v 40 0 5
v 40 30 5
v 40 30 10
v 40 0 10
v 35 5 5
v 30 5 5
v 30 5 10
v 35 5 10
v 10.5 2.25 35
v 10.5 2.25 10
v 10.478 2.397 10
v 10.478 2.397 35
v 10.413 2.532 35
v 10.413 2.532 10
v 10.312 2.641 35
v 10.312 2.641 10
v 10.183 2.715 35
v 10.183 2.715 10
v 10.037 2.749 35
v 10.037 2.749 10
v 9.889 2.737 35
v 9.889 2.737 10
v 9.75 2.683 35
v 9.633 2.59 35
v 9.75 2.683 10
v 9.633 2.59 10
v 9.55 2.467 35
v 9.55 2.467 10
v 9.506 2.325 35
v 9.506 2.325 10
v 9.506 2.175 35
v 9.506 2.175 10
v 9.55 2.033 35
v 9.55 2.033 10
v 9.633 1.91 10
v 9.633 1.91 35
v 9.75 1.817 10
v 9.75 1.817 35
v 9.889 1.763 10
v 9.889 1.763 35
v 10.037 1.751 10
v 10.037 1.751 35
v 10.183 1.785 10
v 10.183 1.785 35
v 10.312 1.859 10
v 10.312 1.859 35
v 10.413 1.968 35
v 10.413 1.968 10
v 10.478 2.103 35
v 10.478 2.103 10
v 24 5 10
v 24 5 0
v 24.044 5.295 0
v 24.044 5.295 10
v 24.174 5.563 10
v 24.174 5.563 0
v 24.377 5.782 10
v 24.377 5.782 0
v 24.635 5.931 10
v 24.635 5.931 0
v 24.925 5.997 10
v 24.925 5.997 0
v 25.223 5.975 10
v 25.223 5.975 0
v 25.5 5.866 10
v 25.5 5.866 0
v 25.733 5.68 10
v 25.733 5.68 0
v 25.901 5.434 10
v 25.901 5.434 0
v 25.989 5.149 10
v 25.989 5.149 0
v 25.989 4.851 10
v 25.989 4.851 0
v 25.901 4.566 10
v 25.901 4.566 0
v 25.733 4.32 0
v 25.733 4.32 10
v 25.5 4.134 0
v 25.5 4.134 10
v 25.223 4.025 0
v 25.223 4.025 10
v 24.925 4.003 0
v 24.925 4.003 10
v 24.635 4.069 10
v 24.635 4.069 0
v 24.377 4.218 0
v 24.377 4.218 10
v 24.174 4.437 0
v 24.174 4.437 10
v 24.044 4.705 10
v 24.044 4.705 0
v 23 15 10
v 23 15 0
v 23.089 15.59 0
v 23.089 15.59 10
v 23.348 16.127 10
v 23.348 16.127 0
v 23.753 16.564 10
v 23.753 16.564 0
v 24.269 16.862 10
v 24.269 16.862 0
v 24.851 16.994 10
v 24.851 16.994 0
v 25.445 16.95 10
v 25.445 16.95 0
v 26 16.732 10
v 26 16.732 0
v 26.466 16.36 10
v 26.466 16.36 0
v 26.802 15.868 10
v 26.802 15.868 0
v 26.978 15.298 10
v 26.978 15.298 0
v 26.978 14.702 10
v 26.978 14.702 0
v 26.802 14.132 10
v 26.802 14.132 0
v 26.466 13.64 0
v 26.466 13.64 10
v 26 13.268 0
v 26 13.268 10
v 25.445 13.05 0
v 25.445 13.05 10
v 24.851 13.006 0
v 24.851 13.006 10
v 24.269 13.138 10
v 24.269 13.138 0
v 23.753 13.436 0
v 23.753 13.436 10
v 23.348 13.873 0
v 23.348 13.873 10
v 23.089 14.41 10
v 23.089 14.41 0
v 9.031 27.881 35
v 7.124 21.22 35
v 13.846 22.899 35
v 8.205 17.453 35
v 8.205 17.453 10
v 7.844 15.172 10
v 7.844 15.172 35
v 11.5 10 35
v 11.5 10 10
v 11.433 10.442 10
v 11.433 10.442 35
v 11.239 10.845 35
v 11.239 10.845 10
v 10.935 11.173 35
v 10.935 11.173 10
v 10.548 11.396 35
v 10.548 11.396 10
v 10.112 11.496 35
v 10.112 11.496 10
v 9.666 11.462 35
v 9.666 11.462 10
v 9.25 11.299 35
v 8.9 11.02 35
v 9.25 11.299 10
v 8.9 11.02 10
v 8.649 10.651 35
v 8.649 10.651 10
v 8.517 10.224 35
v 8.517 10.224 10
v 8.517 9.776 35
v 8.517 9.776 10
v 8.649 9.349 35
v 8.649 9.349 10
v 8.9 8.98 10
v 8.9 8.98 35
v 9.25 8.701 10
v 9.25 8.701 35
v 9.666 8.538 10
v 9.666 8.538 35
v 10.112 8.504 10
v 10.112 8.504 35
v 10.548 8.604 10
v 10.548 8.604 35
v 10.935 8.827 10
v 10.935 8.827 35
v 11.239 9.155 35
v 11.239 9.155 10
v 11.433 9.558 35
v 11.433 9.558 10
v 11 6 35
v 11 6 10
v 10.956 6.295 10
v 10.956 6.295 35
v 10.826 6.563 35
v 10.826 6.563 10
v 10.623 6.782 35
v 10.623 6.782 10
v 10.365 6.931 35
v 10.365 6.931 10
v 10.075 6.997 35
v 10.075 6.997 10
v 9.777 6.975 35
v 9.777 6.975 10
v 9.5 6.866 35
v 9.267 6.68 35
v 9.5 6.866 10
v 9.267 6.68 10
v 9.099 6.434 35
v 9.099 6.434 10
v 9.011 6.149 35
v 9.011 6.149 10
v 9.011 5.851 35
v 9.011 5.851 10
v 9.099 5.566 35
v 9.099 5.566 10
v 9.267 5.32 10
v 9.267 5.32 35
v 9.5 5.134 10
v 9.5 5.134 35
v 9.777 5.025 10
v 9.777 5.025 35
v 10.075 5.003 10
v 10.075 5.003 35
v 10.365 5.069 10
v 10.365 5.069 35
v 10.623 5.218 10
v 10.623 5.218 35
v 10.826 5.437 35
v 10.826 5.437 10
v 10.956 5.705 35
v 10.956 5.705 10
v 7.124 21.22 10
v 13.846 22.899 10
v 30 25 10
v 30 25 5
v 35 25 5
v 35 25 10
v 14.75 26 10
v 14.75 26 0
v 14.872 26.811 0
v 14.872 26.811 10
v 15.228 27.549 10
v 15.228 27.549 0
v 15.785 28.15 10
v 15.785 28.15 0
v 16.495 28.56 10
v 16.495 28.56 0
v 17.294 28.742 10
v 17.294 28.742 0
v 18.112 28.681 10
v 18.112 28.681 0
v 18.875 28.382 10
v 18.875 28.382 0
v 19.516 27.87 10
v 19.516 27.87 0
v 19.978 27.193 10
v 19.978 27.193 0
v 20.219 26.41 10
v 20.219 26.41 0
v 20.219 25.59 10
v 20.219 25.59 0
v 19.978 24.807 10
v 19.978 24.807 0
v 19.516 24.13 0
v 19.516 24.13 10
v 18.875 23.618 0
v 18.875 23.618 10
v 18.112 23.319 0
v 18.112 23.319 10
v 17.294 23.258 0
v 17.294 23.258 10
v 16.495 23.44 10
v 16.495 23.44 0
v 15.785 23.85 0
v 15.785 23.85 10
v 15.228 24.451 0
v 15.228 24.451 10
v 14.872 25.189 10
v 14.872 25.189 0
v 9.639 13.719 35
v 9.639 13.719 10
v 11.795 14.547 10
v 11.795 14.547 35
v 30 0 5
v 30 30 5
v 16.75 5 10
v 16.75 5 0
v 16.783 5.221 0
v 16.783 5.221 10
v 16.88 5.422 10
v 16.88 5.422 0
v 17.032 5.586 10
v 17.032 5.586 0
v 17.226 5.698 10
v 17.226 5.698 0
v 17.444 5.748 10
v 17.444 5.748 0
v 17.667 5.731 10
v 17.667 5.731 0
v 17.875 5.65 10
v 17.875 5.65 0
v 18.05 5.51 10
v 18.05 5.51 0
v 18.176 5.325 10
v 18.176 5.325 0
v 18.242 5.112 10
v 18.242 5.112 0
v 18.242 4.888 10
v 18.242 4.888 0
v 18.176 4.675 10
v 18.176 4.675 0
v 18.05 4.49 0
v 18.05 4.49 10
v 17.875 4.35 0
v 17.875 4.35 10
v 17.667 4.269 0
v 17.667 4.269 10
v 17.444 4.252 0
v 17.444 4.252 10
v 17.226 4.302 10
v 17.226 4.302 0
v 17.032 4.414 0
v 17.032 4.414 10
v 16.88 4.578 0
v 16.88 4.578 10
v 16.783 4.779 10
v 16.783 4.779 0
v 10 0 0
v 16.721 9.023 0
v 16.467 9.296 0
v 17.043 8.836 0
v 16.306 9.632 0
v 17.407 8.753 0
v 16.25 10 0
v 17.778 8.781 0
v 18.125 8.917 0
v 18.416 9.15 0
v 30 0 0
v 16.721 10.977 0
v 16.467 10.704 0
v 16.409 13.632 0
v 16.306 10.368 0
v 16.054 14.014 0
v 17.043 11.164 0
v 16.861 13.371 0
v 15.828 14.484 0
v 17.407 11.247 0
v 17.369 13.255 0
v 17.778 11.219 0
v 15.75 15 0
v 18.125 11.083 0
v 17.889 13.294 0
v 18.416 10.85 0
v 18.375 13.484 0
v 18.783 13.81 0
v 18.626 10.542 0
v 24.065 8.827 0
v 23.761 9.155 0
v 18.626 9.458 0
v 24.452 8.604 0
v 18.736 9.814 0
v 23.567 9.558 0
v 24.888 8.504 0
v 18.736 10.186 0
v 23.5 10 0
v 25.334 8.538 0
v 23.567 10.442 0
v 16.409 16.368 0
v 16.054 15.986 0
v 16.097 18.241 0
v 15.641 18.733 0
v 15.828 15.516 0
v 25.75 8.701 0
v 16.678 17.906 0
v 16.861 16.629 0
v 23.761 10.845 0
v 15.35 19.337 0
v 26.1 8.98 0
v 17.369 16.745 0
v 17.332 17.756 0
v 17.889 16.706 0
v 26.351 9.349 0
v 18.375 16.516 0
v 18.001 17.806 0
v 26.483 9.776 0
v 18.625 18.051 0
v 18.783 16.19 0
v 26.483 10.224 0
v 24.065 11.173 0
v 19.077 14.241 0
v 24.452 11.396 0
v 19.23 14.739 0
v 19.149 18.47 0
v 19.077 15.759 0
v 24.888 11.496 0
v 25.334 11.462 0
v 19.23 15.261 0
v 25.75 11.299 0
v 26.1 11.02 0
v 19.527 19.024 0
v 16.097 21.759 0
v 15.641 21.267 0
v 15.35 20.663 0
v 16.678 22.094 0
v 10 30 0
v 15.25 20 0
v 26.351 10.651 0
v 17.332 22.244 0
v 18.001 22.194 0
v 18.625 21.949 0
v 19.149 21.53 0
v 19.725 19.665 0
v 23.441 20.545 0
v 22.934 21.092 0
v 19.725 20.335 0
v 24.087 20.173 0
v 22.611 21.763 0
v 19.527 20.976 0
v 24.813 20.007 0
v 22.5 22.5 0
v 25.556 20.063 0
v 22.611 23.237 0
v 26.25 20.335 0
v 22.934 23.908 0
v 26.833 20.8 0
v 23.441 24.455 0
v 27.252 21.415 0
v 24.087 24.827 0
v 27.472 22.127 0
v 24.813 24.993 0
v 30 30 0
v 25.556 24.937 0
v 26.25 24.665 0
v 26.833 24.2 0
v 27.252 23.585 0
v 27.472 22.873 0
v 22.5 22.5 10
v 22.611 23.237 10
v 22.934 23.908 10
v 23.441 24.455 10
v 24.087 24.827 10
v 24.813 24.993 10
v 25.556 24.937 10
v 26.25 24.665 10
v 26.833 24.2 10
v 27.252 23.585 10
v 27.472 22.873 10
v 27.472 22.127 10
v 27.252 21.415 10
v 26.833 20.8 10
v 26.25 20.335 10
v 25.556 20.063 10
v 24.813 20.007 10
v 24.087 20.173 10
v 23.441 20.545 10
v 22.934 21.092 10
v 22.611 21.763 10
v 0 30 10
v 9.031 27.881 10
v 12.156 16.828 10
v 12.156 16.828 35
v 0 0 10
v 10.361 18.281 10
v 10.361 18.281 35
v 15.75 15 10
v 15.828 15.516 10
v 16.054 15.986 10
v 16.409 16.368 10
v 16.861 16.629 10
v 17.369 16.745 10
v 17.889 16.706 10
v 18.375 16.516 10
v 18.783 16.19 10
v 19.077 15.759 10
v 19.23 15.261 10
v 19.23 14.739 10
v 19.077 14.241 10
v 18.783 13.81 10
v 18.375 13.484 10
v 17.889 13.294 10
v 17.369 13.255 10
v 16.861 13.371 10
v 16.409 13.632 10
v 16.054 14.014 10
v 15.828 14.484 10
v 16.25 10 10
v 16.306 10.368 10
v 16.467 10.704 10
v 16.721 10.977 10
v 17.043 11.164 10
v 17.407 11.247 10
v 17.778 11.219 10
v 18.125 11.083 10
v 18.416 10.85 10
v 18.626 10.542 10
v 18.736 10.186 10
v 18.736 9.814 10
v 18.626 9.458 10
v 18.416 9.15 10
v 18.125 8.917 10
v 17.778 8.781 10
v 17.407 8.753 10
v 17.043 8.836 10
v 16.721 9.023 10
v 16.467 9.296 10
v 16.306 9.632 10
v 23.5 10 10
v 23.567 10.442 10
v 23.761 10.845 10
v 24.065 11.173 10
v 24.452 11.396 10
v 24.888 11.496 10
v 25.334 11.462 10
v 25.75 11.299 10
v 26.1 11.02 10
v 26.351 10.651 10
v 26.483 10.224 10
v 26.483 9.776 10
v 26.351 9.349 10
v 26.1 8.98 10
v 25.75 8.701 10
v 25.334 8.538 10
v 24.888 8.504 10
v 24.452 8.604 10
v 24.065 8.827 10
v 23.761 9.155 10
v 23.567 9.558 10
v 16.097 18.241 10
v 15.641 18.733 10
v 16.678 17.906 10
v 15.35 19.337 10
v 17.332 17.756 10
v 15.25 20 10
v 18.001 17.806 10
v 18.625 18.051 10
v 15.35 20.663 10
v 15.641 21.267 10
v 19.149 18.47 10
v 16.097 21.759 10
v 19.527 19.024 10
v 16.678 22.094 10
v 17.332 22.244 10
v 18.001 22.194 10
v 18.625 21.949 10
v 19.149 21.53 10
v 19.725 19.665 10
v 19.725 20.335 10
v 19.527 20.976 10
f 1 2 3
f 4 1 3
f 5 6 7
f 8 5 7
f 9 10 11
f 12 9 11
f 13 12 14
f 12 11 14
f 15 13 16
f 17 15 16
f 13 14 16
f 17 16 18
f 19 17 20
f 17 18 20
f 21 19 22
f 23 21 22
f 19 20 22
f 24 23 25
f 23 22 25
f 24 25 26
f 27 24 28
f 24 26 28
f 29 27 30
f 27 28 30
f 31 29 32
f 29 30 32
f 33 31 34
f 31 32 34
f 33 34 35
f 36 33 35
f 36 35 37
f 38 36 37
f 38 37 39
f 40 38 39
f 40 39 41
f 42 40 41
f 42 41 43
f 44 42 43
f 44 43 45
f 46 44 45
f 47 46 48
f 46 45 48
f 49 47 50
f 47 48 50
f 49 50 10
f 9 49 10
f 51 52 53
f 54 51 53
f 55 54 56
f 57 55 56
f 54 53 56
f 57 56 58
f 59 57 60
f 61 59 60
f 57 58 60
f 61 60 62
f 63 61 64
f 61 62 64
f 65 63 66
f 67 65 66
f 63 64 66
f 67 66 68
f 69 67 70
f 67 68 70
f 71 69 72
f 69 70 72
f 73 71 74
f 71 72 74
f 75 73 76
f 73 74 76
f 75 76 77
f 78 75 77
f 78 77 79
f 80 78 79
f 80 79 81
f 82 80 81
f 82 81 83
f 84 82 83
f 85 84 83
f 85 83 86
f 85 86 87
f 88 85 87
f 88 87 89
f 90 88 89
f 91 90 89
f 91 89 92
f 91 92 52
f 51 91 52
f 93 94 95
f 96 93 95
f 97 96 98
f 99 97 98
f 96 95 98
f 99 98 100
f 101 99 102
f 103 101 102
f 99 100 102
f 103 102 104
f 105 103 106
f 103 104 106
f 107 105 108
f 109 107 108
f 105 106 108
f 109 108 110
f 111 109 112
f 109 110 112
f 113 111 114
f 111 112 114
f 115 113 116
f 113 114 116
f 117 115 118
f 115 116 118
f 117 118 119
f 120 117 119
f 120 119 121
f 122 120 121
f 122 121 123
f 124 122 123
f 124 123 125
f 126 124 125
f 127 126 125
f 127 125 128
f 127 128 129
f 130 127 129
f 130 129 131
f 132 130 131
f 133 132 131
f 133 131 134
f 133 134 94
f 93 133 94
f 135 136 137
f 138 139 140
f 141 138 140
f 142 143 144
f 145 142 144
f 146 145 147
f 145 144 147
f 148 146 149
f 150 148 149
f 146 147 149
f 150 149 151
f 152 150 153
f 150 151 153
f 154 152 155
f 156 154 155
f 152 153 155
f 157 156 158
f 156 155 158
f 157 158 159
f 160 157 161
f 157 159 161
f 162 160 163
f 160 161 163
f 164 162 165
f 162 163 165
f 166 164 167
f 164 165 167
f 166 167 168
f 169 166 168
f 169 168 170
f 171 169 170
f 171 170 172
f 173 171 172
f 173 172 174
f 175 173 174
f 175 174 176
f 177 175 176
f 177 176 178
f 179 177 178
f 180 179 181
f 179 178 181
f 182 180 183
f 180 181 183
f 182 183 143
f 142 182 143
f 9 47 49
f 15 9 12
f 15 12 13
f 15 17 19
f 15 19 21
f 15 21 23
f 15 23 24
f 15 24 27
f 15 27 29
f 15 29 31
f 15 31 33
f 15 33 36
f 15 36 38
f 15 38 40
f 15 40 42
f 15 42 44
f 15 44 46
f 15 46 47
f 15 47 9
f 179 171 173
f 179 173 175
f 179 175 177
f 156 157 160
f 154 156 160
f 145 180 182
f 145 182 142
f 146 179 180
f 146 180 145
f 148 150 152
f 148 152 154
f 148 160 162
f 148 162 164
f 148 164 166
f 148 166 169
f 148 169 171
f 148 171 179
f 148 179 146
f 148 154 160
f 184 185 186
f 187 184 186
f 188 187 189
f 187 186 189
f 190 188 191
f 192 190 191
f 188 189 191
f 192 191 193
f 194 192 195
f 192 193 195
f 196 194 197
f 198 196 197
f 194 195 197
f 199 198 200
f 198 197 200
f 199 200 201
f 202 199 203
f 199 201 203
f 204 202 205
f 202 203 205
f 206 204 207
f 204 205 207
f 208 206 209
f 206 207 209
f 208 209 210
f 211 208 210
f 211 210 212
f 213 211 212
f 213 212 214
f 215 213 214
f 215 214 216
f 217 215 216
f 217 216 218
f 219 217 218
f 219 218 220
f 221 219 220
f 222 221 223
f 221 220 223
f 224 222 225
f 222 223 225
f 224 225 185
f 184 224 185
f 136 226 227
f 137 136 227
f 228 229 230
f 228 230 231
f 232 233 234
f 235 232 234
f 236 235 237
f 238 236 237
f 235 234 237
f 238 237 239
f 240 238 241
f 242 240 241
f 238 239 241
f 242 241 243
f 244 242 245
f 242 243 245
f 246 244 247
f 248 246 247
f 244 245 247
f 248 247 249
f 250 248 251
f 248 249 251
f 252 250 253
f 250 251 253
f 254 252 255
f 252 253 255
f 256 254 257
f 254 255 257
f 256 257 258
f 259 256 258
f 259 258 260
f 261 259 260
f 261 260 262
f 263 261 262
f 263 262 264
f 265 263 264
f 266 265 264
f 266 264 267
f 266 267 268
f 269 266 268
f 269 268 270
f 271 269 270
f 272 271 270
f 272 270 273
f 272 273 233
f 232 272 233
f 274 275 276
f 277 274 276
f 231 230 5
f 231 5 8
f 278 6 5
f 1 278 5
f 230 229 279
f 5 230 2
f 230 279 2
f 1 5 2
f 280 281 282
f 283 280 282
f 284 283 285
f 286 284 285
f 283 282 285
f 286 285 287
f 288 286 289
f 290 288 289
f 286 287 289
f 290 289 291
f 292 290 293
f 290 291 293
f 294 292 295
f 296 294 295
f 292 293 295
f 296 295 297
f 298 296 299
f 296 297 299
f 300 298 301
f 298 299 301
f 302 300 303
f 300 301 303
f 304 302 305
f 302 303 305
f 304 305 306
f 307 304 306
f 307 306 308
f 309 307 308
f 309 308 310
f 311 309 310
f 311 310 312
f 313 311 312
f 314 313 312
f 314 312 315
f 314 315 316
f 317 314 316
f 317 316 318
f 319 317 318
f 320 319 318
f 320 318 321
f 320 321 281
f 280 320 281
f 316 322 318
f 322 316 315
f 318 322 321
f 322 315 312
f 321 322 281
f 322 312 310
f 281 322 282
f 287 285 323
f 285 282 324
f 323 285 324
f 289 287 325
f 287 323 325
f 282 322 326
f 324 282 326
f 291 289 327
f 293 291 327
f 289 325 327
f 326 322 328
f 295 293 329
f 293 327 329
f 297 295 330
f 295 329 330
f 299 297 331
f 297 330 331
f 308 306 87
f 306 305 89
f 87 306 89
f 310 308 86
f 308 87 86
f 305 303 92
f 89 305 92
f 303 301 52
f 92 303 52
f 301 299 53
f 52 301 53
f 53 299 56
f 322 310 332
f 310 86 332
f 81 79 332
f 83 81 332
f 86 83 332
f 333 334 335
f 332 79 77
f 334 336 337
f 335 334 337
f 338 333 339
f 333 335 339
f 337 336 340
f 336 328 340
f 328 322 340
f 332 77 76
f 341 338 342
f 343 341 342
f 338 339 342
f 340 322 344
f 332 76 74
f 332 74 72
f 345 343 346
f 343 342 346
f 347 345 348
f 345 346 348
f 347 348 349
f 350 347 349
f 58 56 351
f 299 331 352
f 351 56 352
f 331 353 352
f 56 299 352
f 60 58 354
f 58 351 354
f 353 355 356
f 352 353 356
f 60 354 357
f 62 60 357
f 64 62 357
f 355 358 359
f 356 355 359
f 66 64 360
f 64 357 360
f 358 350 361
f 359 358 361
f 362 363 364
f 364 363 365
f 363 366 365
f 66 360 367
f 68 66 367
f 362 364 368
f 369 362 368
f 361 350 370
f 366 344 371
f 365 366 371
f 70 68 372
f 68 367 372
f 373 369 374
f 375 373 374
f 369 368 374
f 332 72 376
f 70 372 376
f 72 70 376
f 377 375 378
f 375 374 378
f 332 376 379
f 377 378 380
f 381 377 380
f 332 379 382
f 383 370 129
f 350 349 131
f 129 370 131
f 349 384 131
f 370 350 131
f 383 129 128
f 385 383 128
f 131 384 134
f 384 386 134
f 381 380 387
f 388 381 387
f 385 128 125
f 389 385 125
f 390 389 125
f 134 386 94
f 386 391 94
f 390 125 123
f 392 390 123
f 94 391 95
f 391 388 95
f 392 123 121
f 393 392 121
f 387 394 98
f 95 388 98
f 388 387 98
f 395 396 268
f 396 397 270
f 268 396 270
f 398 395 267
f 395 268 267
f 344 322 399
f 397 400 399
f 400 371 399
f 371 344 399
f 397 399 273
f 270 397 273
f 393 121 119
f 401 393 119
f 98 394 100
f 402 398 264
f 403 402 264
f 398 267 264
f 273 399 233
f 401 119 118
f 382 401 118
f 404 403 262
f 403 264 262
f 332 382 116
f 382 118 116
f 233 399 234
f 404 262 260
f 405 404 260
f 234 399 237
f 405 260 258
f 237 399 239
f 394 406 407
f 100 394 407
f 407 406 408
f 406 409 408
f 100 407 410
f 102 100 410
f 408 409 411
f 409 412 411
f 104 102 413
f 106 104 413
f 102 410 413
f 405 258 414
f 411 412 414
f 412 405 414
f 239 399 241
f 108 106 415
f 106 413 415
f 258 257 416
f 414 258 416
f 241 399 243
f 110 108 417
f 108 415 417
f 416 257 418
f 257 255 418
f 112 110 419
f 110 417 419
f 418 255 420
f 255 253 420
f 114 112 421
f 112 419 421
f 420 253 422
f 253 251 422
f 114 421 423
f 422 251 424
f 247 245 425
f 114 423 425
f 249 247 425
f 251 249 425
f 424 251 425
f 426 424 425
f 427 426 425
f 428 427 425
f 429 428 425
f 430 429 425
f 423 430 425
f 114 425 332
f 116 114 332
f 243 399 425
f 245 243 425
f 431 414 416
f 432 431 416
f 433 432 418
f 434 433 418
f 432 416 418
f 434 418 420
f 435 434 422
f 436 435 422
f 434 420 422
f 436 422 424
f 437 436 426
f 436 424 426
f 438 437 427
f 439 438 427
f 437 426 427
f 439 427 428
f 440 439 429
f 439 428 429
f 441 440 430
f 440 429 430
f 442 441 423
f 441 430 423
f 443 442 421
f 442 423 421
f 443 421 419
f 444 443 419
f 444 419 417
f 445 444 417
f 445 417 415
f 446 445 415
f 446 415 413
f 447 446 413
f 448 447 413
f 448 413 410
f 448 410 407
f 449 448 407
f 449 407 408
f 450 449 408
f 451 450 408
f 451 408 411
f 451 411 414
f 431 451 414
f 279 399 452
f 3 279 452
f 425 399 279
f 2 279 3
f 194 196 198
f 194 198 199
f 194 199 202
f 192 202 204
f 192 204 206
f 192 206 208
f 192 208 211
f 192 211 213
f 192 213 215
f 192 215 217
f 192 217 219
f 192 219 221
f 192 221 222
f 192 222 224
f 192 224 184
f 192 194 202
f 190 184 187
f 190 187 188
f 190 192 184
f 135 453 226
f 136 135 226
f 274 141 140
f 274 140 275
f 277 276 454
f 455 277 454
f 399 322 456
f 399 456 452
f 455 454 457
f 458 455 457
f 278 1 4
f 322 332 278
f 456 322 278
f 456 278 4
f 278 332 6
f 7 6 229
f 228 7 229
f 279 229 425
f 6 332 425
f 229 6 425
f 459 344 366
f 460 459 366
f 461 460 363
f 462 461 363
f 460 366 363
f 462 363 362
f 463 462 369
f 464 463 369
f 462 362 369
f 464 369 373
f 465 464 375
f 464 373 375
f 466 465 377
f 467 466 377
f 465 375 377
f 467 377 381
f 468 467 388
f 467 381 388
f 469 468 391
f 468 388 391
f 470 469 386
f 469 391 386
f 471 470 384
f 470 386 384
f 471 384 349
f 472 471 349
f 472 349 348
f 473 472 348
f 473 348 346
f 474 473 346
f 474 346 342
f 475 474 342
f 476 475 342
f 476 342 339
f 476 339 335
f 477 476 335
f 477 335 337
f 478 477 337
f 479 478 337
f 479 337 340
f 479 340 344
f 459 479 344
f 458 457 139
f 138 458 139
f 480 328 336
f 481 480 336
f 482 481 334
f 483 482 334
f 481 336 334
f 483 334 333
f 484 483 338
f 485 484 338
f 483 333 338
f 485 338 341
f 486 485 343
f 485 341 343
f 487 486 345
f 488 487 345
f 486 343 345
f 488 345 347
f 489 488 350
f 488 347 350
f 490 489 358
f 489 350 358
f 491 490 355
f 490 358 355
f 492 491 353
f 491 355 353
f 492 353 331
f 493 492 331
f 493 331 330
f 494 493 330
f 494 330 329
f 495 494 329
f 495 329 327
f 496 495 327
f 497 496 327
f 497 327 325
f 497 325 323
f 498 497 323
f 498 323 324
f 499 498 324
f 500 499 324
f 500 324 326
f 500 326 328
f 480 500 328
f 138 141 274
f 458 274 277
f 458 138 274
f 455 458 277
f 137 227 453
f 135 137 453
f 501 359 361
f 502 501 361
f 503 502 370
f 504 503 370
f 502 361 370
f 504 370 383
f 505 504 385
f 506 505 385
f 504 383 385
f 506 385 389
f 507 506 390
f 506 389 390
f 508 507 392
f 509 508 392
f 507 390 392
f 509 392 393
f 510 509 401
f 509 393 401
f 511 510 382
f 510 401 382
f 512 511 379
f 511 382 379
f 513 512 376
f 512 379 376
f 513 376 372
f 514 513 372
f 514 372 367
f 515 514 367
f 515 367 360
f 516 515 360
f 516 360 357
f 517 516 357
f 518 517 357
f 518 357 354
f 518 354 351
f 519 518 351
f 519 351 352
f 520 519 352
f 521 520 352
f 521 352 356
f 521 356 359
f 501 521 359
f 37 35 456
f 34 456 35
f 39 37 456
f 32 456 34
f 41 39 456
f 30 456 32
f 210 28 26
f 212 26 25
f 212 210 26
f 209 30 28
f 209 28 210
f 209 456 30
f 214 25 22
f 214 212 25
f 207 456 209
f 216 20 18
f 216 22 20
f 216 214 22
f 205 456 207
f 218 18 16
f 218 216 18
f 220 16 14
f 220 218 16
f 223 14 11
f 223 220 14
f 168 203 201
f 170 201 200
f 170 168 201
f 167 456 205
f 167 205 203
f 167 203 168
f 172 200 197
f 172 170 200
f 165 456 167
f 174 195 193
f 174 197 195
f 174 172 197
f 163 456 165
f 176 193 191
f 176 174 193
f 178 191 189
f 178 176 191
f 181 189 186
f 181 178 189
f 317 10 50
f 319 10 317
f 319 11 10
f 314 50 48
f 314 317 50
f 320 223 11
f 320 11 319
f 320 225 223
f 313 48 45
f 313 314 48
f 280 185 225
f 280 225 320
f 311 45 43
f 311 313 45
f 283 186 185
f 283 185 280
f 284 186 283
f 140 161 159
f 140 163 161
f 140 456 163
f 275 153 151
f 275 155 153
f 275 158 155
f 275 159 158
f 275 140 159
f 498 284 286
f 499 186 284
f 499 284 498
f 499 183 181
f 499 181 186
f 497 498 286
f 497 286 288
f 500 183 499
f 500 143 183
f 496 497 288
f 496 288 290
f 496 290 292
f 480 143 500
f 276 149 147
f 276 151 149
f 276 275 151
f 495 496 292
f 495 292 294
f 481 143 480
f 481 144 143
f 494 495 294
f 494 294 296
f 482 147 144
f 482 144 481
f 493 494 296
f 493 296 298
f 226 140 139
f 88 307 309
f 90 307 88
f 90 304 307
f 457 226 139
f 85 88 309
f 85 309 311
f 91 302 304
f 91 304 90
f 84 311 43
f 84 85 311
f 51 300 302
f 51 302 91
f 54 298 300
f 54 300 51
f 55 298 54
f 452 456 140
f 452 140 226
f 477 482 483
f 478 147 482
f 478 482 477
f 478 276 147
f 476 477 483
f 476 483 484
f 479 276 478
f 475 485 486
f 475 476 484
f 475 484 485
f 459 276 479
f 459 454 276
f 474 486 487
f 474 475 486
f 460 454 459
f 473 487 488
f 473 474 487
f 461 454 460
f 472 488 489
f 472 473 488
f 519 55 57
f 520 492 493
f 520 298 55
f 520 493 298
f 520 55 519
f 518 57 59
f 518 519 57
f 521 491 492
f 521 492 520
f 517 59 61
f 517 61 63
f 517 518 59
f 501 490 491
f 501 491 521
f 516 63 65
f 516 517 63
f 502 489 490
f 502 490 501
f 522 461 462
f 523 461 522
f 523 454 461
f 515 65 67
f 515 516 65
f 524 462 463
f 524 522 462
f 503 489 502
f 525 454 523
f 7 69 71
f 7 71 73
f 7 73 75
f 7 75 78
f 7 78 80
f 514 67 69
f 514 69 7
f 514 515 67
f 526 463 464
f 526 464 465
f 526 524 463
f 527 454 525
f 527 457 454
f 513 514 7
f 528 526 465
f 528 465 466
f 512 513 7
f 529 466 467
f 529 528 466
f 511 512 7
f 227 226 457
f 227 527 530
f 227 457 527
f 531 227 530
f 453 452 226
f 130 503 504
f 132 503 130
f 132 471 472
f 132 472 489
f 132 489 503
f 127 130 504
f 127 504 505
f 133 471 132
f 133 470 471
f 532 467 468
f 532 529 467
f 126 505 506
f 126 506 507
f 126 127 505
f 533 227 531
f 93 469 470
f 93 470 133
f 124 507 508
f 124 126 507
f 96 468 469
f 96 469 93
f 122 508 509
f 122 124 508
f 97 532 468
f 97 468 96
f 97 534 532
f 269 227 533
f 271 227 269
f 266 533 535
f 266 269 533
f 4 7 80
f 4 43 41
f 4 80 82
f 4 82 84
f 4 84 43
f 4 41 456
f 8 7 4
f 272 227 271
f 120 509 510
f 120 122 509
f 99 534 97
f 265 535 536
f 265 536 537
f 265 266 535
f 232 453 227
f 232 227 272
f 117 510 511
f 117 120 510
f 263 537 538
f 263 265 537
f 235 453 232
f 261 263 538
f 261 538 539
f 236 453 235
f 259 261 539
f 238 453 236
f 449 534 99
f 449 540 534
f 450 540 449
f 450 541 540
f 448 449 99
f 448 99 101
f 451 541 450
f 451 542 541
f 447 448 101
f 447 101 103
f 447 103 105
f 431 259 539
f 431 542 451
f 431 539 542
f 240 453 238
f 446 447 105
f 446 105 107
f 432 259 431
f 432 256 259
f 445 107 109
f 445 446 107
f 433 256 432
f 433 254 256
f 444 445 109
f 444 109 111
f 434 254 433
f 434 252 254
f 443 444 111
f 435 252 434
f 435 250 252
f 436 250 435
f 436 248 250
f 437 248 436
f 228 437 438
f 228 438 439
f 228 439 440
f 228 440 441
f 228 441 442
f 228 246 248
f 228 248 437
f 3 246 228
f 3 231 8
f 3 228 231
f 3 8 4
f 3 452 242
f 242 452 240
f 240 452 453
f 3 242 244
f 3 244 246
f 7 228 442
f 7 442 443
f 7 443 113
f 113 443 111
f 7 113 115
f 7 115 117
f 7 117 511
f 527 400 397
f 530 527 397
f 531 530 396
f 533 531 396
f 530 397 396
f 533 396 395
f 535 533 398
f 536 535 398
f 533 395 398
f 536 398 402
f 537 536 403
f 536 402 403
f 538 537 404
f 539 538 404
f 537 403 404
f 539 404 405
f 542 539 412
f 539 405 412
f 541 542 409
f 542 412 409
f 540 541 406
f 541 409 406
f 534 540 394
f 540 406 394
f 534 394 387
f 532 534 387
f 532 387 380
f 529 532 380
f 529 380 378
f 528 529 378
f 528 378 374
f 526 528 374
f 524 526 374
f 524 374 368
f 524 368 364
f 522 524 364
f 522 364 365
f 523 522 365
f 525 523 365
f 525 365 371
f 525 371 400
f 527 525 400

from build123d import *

# Parameters (mm, degrees)
F0_W      = 30
F0_H      = 30
F1_DEPTH  = 10
F2_W      = 10
F2_H      = 30
F3_DEPTH  = 20
F5_D      = 2
F5_DEPTH  = 20
F5_TIP    = 0.600860619
F7_D      = 3
F7_DEPTH  = 20
F7_TIP    = 0.9012909285
F9_D      = 4
F9_DEPTH  = 20
F9_TIP    = 1.2017212381
F11_D     = 5
F11_DEPTH = 20
F11_TIP   = 1.5021515476
F13_D     = 1.5
F13_DEPTH = 20
F13_TIP   = 0.4506454643
F15_D     = 2.5
F15_DEPTH = 20
F15_TIP   = 0.7510757738
F17_D     = 3.5
F17_DEPTH = 20
F17_TIP   = 1.0515060833
F19_D     = 4.5
F19_DEPTH = 20
F19_TIP   = 1.3519363928
F21_D     = 5.5
F21_DEPTH = 20
F21_TIP   = 1.6523667023
F22_DEPTH = 20
F23_SIZE  = 9.99999
F24_R     = 1
F25_DEPTH = 25
F26_R     = 1.5
F27_DEPTH = 25
F28_R     = 0.5
F29_DEPTH = 25
F31_DEPTH = 25
F33_DEPTH = 25
F34_W     = 5
F34_H     = 5
F35_DEPTH = 10
F36_W     = 5
F36_H     = 5
F37_DEPTH = 25


# Not quite as in the source:
# - a fillet or chamfer is up to 0.001 mm smaller than in the source, because OpenCascade refuses the exact size


with BuildPart() as f1:
    # F0 (on Top) → F1 (new body)
    with BuildSketch(Plane.XY):
        with Locations((15, 15)):
            Rectangle(F0_W, F0_H)
    extrude(amount=F1_DEPTH)

    # F2 (on face) → F3 (join)
    with BuildSketch(Plane.XY.offset(10)):
        with Locations((5, 15)):
            Rectangle(F2_W, F2_H)
    extrude(amount=F3_DEPTH)

    # F5
    with Locations(Plane.XY.offset(10)):
        with Locations((25, 5)):
            Hole(F5_D / 2, depth=F5_DEPTH)
            with Locations((0, 0, -(F5_DEPTH + F5_TIP / 2))):  # 118° drill point
                Cone(0, F5_D / 2, F5_TIP, mode=Mode.SUBTRACT)

    # F7
    with Locations(Plane.XY.offset(10)):
        with Locations((25, 10)):
            Hole(F7_D / 2, depth=F7_DEPTH)
            with Locations((0, 0, -(F7_DEPTH + F7_TIP / 2))):  # 118° drill point
                Cone(0, F7_D / 2, F7_TIP, mode=Mode.SUBTRACT)

    # F9
    with Locations(Plane.XY.offset(10)):
        with Locations((25, 15)):
            Hole(F9_D / 2, depth=F9_DEPTH)
            with Locations((0, 0, -(F9_DEPTH + F9_TIP / 2))):  # 118° drill point
                Cone(0, F9_D / 2, F9_TIP, mode=Mode.SUBTRACT)

    # F11
    with Locations(Plane.XY.offset(10)):
        with Locations((25, 22.5)):
            Hole(F11_D / 2, depth=F11_DEPTH)
            with Locations((0, 0, -(F11_DEPTH + F11_TIP / 2))):  # 118° drill point
                Cone(0, F11_D / 2, F11_TIP, mode=Mode.SUBTRACT)

    # F13
    with Locations(Plane.XY.offset(10)):
        with Locations((17.5, 5)):
            Hole(F13_D / 2, depth=F13_DEPTH)
            with Locations((0, 0, -(F13_DEPTH + F13_TIP / 2))):  # 118° drill point
                Cone(0, F13_D / 2, F13_TIP, mode=Mode.SUBTRACT)

    # F15
    with Locations(Plane.XY.offset(10)):
        with Locations((17.5, 10)):
            Hole(F15_D / 2, depth=F15_DEPTH)
            with Locations((0, 0, -(F15_DEPTH + F15_TIP / 2))):  # 118° drill point
                Cone(0, F15_D / 2, F15_TIP, mode=Mode.SUBTRACT)

    # F17
    with Locations(Plane.XY.offset(10)):
        with Locations((17.5, 15)):
            Hole(F17_D / 2, depth=F17_DEPTH)
            with Locations((0, 0, -(F17_DEPTH + F17_TIP / 2))):  # 118° drill point
                Cone(0, F17_D / 2, F17_TIP, mode=Mode.SUBTRACT)

    # F19
    with Locations(Plane.XY.offset(10)):
        with Locations((17.5, 20)):
            Hole(F19_D / 2, depth=F19_DEPTH)
            with Locations((0, 0, -(F19_DEPTH + F19_TIP / 2))):  # 118° drill point
                Cone(0, F19_D / 2, F19_TIP, mode=Mode.SUBTRACT)

    # F21
    with Locations(Plane.XY.offset(10)):
        with Locations((17.5, 26)):
            Hole(F21_D / 2, depth=F21_DEPTH)
            with Locations((0, 0, -(F21_DEPTH + F21_TIP / 2))):  # 118° drill point
                Cone(0, F21_D / 2, F21_TIP, mode=Mode.SUBTRACT)

    # F22 (cut): a face of the model
    f22_faces = [f1.faces().sort_by_distance(p)[0] for p in [
        (5, 15, 30),
    ]]
    extrude(f22_faces, amount=-F22_DEPTH, mode=Mode.SUBTRACT)

    # F23 (size 10 in the source; OpenCascade refuses exactly that, so slightly less here)
    f23_edges = [f1.edges().sort_by_distance(p)[0] for p in [
        (0, 15, 0),
    ]]
    chamfer(f23_edges, length=F23_SIZE)

    # F24 (on face) → F25 (join)
    with BuildSketch(Plane.XY.offset(10)):
        with Locations((10, 6)):
            Circle(F24_R)
    extrude(amount=F25_DEPTH)

    # F26 (on face) → F27 (join)
    with BuildSketch(Plane.XY.offset(10)):
        with Locations((10, 10)):
            Circle(F26_R)
    extrude(amount=F27_DEPTH)

    # F28 (on face) → F29 (join)
    with BuildSketch(Plane.XY.offset(10)):
        with Locations((10, 2.25)):
            Circle(F28_R)
    extrude(amount=F29_DEPTH)

    # F30 (on face) → F31 (join)
    with BuildSketch(Plane.XY.offset(10)):
        Polygon((12.1558459991, 16.8280467147), (10.3608135091, 18.2810407592), (8.20496751, 17.4529940445), (7.8441540009, 15.1719532853), (9.6391864909, 13.7189592408), (11.79503249, 14.5470059555), align=None)
    extrude(amount=F31_DEPTH)

    # F32 (on face) → F33 (join)
    with BuildSketch(Plane.XY.offset(10)):
        Polygon((13.8455249644, 22.8991195577), (9.0306279474, 27.8807625312), (7.1238470882, 21.2201179111), align=None)
    extrude(amount=F33_DEPTH)

    # F34 (on face) → F35 (join)
    with BuildSketch(Plane.YZ.offset(30)):
        with Locations((2.5, 7.5)):
            Rectangle(F34_W, F34_H)
        with Locations((27.5, 7.5)):
            Rectangle(F34_W, F34_H)
    extrude(amount=F35_DEPTH)

    # F36 (on face) → F37 (join)
    with BuildSketch(Plane.XZ.offset(-25)):
        with Locations((37.5, 7.5)):
            Rectangle(F36_W, F36_H)
    extrude(amount=F37_DEPTH)


solid = f1.part
